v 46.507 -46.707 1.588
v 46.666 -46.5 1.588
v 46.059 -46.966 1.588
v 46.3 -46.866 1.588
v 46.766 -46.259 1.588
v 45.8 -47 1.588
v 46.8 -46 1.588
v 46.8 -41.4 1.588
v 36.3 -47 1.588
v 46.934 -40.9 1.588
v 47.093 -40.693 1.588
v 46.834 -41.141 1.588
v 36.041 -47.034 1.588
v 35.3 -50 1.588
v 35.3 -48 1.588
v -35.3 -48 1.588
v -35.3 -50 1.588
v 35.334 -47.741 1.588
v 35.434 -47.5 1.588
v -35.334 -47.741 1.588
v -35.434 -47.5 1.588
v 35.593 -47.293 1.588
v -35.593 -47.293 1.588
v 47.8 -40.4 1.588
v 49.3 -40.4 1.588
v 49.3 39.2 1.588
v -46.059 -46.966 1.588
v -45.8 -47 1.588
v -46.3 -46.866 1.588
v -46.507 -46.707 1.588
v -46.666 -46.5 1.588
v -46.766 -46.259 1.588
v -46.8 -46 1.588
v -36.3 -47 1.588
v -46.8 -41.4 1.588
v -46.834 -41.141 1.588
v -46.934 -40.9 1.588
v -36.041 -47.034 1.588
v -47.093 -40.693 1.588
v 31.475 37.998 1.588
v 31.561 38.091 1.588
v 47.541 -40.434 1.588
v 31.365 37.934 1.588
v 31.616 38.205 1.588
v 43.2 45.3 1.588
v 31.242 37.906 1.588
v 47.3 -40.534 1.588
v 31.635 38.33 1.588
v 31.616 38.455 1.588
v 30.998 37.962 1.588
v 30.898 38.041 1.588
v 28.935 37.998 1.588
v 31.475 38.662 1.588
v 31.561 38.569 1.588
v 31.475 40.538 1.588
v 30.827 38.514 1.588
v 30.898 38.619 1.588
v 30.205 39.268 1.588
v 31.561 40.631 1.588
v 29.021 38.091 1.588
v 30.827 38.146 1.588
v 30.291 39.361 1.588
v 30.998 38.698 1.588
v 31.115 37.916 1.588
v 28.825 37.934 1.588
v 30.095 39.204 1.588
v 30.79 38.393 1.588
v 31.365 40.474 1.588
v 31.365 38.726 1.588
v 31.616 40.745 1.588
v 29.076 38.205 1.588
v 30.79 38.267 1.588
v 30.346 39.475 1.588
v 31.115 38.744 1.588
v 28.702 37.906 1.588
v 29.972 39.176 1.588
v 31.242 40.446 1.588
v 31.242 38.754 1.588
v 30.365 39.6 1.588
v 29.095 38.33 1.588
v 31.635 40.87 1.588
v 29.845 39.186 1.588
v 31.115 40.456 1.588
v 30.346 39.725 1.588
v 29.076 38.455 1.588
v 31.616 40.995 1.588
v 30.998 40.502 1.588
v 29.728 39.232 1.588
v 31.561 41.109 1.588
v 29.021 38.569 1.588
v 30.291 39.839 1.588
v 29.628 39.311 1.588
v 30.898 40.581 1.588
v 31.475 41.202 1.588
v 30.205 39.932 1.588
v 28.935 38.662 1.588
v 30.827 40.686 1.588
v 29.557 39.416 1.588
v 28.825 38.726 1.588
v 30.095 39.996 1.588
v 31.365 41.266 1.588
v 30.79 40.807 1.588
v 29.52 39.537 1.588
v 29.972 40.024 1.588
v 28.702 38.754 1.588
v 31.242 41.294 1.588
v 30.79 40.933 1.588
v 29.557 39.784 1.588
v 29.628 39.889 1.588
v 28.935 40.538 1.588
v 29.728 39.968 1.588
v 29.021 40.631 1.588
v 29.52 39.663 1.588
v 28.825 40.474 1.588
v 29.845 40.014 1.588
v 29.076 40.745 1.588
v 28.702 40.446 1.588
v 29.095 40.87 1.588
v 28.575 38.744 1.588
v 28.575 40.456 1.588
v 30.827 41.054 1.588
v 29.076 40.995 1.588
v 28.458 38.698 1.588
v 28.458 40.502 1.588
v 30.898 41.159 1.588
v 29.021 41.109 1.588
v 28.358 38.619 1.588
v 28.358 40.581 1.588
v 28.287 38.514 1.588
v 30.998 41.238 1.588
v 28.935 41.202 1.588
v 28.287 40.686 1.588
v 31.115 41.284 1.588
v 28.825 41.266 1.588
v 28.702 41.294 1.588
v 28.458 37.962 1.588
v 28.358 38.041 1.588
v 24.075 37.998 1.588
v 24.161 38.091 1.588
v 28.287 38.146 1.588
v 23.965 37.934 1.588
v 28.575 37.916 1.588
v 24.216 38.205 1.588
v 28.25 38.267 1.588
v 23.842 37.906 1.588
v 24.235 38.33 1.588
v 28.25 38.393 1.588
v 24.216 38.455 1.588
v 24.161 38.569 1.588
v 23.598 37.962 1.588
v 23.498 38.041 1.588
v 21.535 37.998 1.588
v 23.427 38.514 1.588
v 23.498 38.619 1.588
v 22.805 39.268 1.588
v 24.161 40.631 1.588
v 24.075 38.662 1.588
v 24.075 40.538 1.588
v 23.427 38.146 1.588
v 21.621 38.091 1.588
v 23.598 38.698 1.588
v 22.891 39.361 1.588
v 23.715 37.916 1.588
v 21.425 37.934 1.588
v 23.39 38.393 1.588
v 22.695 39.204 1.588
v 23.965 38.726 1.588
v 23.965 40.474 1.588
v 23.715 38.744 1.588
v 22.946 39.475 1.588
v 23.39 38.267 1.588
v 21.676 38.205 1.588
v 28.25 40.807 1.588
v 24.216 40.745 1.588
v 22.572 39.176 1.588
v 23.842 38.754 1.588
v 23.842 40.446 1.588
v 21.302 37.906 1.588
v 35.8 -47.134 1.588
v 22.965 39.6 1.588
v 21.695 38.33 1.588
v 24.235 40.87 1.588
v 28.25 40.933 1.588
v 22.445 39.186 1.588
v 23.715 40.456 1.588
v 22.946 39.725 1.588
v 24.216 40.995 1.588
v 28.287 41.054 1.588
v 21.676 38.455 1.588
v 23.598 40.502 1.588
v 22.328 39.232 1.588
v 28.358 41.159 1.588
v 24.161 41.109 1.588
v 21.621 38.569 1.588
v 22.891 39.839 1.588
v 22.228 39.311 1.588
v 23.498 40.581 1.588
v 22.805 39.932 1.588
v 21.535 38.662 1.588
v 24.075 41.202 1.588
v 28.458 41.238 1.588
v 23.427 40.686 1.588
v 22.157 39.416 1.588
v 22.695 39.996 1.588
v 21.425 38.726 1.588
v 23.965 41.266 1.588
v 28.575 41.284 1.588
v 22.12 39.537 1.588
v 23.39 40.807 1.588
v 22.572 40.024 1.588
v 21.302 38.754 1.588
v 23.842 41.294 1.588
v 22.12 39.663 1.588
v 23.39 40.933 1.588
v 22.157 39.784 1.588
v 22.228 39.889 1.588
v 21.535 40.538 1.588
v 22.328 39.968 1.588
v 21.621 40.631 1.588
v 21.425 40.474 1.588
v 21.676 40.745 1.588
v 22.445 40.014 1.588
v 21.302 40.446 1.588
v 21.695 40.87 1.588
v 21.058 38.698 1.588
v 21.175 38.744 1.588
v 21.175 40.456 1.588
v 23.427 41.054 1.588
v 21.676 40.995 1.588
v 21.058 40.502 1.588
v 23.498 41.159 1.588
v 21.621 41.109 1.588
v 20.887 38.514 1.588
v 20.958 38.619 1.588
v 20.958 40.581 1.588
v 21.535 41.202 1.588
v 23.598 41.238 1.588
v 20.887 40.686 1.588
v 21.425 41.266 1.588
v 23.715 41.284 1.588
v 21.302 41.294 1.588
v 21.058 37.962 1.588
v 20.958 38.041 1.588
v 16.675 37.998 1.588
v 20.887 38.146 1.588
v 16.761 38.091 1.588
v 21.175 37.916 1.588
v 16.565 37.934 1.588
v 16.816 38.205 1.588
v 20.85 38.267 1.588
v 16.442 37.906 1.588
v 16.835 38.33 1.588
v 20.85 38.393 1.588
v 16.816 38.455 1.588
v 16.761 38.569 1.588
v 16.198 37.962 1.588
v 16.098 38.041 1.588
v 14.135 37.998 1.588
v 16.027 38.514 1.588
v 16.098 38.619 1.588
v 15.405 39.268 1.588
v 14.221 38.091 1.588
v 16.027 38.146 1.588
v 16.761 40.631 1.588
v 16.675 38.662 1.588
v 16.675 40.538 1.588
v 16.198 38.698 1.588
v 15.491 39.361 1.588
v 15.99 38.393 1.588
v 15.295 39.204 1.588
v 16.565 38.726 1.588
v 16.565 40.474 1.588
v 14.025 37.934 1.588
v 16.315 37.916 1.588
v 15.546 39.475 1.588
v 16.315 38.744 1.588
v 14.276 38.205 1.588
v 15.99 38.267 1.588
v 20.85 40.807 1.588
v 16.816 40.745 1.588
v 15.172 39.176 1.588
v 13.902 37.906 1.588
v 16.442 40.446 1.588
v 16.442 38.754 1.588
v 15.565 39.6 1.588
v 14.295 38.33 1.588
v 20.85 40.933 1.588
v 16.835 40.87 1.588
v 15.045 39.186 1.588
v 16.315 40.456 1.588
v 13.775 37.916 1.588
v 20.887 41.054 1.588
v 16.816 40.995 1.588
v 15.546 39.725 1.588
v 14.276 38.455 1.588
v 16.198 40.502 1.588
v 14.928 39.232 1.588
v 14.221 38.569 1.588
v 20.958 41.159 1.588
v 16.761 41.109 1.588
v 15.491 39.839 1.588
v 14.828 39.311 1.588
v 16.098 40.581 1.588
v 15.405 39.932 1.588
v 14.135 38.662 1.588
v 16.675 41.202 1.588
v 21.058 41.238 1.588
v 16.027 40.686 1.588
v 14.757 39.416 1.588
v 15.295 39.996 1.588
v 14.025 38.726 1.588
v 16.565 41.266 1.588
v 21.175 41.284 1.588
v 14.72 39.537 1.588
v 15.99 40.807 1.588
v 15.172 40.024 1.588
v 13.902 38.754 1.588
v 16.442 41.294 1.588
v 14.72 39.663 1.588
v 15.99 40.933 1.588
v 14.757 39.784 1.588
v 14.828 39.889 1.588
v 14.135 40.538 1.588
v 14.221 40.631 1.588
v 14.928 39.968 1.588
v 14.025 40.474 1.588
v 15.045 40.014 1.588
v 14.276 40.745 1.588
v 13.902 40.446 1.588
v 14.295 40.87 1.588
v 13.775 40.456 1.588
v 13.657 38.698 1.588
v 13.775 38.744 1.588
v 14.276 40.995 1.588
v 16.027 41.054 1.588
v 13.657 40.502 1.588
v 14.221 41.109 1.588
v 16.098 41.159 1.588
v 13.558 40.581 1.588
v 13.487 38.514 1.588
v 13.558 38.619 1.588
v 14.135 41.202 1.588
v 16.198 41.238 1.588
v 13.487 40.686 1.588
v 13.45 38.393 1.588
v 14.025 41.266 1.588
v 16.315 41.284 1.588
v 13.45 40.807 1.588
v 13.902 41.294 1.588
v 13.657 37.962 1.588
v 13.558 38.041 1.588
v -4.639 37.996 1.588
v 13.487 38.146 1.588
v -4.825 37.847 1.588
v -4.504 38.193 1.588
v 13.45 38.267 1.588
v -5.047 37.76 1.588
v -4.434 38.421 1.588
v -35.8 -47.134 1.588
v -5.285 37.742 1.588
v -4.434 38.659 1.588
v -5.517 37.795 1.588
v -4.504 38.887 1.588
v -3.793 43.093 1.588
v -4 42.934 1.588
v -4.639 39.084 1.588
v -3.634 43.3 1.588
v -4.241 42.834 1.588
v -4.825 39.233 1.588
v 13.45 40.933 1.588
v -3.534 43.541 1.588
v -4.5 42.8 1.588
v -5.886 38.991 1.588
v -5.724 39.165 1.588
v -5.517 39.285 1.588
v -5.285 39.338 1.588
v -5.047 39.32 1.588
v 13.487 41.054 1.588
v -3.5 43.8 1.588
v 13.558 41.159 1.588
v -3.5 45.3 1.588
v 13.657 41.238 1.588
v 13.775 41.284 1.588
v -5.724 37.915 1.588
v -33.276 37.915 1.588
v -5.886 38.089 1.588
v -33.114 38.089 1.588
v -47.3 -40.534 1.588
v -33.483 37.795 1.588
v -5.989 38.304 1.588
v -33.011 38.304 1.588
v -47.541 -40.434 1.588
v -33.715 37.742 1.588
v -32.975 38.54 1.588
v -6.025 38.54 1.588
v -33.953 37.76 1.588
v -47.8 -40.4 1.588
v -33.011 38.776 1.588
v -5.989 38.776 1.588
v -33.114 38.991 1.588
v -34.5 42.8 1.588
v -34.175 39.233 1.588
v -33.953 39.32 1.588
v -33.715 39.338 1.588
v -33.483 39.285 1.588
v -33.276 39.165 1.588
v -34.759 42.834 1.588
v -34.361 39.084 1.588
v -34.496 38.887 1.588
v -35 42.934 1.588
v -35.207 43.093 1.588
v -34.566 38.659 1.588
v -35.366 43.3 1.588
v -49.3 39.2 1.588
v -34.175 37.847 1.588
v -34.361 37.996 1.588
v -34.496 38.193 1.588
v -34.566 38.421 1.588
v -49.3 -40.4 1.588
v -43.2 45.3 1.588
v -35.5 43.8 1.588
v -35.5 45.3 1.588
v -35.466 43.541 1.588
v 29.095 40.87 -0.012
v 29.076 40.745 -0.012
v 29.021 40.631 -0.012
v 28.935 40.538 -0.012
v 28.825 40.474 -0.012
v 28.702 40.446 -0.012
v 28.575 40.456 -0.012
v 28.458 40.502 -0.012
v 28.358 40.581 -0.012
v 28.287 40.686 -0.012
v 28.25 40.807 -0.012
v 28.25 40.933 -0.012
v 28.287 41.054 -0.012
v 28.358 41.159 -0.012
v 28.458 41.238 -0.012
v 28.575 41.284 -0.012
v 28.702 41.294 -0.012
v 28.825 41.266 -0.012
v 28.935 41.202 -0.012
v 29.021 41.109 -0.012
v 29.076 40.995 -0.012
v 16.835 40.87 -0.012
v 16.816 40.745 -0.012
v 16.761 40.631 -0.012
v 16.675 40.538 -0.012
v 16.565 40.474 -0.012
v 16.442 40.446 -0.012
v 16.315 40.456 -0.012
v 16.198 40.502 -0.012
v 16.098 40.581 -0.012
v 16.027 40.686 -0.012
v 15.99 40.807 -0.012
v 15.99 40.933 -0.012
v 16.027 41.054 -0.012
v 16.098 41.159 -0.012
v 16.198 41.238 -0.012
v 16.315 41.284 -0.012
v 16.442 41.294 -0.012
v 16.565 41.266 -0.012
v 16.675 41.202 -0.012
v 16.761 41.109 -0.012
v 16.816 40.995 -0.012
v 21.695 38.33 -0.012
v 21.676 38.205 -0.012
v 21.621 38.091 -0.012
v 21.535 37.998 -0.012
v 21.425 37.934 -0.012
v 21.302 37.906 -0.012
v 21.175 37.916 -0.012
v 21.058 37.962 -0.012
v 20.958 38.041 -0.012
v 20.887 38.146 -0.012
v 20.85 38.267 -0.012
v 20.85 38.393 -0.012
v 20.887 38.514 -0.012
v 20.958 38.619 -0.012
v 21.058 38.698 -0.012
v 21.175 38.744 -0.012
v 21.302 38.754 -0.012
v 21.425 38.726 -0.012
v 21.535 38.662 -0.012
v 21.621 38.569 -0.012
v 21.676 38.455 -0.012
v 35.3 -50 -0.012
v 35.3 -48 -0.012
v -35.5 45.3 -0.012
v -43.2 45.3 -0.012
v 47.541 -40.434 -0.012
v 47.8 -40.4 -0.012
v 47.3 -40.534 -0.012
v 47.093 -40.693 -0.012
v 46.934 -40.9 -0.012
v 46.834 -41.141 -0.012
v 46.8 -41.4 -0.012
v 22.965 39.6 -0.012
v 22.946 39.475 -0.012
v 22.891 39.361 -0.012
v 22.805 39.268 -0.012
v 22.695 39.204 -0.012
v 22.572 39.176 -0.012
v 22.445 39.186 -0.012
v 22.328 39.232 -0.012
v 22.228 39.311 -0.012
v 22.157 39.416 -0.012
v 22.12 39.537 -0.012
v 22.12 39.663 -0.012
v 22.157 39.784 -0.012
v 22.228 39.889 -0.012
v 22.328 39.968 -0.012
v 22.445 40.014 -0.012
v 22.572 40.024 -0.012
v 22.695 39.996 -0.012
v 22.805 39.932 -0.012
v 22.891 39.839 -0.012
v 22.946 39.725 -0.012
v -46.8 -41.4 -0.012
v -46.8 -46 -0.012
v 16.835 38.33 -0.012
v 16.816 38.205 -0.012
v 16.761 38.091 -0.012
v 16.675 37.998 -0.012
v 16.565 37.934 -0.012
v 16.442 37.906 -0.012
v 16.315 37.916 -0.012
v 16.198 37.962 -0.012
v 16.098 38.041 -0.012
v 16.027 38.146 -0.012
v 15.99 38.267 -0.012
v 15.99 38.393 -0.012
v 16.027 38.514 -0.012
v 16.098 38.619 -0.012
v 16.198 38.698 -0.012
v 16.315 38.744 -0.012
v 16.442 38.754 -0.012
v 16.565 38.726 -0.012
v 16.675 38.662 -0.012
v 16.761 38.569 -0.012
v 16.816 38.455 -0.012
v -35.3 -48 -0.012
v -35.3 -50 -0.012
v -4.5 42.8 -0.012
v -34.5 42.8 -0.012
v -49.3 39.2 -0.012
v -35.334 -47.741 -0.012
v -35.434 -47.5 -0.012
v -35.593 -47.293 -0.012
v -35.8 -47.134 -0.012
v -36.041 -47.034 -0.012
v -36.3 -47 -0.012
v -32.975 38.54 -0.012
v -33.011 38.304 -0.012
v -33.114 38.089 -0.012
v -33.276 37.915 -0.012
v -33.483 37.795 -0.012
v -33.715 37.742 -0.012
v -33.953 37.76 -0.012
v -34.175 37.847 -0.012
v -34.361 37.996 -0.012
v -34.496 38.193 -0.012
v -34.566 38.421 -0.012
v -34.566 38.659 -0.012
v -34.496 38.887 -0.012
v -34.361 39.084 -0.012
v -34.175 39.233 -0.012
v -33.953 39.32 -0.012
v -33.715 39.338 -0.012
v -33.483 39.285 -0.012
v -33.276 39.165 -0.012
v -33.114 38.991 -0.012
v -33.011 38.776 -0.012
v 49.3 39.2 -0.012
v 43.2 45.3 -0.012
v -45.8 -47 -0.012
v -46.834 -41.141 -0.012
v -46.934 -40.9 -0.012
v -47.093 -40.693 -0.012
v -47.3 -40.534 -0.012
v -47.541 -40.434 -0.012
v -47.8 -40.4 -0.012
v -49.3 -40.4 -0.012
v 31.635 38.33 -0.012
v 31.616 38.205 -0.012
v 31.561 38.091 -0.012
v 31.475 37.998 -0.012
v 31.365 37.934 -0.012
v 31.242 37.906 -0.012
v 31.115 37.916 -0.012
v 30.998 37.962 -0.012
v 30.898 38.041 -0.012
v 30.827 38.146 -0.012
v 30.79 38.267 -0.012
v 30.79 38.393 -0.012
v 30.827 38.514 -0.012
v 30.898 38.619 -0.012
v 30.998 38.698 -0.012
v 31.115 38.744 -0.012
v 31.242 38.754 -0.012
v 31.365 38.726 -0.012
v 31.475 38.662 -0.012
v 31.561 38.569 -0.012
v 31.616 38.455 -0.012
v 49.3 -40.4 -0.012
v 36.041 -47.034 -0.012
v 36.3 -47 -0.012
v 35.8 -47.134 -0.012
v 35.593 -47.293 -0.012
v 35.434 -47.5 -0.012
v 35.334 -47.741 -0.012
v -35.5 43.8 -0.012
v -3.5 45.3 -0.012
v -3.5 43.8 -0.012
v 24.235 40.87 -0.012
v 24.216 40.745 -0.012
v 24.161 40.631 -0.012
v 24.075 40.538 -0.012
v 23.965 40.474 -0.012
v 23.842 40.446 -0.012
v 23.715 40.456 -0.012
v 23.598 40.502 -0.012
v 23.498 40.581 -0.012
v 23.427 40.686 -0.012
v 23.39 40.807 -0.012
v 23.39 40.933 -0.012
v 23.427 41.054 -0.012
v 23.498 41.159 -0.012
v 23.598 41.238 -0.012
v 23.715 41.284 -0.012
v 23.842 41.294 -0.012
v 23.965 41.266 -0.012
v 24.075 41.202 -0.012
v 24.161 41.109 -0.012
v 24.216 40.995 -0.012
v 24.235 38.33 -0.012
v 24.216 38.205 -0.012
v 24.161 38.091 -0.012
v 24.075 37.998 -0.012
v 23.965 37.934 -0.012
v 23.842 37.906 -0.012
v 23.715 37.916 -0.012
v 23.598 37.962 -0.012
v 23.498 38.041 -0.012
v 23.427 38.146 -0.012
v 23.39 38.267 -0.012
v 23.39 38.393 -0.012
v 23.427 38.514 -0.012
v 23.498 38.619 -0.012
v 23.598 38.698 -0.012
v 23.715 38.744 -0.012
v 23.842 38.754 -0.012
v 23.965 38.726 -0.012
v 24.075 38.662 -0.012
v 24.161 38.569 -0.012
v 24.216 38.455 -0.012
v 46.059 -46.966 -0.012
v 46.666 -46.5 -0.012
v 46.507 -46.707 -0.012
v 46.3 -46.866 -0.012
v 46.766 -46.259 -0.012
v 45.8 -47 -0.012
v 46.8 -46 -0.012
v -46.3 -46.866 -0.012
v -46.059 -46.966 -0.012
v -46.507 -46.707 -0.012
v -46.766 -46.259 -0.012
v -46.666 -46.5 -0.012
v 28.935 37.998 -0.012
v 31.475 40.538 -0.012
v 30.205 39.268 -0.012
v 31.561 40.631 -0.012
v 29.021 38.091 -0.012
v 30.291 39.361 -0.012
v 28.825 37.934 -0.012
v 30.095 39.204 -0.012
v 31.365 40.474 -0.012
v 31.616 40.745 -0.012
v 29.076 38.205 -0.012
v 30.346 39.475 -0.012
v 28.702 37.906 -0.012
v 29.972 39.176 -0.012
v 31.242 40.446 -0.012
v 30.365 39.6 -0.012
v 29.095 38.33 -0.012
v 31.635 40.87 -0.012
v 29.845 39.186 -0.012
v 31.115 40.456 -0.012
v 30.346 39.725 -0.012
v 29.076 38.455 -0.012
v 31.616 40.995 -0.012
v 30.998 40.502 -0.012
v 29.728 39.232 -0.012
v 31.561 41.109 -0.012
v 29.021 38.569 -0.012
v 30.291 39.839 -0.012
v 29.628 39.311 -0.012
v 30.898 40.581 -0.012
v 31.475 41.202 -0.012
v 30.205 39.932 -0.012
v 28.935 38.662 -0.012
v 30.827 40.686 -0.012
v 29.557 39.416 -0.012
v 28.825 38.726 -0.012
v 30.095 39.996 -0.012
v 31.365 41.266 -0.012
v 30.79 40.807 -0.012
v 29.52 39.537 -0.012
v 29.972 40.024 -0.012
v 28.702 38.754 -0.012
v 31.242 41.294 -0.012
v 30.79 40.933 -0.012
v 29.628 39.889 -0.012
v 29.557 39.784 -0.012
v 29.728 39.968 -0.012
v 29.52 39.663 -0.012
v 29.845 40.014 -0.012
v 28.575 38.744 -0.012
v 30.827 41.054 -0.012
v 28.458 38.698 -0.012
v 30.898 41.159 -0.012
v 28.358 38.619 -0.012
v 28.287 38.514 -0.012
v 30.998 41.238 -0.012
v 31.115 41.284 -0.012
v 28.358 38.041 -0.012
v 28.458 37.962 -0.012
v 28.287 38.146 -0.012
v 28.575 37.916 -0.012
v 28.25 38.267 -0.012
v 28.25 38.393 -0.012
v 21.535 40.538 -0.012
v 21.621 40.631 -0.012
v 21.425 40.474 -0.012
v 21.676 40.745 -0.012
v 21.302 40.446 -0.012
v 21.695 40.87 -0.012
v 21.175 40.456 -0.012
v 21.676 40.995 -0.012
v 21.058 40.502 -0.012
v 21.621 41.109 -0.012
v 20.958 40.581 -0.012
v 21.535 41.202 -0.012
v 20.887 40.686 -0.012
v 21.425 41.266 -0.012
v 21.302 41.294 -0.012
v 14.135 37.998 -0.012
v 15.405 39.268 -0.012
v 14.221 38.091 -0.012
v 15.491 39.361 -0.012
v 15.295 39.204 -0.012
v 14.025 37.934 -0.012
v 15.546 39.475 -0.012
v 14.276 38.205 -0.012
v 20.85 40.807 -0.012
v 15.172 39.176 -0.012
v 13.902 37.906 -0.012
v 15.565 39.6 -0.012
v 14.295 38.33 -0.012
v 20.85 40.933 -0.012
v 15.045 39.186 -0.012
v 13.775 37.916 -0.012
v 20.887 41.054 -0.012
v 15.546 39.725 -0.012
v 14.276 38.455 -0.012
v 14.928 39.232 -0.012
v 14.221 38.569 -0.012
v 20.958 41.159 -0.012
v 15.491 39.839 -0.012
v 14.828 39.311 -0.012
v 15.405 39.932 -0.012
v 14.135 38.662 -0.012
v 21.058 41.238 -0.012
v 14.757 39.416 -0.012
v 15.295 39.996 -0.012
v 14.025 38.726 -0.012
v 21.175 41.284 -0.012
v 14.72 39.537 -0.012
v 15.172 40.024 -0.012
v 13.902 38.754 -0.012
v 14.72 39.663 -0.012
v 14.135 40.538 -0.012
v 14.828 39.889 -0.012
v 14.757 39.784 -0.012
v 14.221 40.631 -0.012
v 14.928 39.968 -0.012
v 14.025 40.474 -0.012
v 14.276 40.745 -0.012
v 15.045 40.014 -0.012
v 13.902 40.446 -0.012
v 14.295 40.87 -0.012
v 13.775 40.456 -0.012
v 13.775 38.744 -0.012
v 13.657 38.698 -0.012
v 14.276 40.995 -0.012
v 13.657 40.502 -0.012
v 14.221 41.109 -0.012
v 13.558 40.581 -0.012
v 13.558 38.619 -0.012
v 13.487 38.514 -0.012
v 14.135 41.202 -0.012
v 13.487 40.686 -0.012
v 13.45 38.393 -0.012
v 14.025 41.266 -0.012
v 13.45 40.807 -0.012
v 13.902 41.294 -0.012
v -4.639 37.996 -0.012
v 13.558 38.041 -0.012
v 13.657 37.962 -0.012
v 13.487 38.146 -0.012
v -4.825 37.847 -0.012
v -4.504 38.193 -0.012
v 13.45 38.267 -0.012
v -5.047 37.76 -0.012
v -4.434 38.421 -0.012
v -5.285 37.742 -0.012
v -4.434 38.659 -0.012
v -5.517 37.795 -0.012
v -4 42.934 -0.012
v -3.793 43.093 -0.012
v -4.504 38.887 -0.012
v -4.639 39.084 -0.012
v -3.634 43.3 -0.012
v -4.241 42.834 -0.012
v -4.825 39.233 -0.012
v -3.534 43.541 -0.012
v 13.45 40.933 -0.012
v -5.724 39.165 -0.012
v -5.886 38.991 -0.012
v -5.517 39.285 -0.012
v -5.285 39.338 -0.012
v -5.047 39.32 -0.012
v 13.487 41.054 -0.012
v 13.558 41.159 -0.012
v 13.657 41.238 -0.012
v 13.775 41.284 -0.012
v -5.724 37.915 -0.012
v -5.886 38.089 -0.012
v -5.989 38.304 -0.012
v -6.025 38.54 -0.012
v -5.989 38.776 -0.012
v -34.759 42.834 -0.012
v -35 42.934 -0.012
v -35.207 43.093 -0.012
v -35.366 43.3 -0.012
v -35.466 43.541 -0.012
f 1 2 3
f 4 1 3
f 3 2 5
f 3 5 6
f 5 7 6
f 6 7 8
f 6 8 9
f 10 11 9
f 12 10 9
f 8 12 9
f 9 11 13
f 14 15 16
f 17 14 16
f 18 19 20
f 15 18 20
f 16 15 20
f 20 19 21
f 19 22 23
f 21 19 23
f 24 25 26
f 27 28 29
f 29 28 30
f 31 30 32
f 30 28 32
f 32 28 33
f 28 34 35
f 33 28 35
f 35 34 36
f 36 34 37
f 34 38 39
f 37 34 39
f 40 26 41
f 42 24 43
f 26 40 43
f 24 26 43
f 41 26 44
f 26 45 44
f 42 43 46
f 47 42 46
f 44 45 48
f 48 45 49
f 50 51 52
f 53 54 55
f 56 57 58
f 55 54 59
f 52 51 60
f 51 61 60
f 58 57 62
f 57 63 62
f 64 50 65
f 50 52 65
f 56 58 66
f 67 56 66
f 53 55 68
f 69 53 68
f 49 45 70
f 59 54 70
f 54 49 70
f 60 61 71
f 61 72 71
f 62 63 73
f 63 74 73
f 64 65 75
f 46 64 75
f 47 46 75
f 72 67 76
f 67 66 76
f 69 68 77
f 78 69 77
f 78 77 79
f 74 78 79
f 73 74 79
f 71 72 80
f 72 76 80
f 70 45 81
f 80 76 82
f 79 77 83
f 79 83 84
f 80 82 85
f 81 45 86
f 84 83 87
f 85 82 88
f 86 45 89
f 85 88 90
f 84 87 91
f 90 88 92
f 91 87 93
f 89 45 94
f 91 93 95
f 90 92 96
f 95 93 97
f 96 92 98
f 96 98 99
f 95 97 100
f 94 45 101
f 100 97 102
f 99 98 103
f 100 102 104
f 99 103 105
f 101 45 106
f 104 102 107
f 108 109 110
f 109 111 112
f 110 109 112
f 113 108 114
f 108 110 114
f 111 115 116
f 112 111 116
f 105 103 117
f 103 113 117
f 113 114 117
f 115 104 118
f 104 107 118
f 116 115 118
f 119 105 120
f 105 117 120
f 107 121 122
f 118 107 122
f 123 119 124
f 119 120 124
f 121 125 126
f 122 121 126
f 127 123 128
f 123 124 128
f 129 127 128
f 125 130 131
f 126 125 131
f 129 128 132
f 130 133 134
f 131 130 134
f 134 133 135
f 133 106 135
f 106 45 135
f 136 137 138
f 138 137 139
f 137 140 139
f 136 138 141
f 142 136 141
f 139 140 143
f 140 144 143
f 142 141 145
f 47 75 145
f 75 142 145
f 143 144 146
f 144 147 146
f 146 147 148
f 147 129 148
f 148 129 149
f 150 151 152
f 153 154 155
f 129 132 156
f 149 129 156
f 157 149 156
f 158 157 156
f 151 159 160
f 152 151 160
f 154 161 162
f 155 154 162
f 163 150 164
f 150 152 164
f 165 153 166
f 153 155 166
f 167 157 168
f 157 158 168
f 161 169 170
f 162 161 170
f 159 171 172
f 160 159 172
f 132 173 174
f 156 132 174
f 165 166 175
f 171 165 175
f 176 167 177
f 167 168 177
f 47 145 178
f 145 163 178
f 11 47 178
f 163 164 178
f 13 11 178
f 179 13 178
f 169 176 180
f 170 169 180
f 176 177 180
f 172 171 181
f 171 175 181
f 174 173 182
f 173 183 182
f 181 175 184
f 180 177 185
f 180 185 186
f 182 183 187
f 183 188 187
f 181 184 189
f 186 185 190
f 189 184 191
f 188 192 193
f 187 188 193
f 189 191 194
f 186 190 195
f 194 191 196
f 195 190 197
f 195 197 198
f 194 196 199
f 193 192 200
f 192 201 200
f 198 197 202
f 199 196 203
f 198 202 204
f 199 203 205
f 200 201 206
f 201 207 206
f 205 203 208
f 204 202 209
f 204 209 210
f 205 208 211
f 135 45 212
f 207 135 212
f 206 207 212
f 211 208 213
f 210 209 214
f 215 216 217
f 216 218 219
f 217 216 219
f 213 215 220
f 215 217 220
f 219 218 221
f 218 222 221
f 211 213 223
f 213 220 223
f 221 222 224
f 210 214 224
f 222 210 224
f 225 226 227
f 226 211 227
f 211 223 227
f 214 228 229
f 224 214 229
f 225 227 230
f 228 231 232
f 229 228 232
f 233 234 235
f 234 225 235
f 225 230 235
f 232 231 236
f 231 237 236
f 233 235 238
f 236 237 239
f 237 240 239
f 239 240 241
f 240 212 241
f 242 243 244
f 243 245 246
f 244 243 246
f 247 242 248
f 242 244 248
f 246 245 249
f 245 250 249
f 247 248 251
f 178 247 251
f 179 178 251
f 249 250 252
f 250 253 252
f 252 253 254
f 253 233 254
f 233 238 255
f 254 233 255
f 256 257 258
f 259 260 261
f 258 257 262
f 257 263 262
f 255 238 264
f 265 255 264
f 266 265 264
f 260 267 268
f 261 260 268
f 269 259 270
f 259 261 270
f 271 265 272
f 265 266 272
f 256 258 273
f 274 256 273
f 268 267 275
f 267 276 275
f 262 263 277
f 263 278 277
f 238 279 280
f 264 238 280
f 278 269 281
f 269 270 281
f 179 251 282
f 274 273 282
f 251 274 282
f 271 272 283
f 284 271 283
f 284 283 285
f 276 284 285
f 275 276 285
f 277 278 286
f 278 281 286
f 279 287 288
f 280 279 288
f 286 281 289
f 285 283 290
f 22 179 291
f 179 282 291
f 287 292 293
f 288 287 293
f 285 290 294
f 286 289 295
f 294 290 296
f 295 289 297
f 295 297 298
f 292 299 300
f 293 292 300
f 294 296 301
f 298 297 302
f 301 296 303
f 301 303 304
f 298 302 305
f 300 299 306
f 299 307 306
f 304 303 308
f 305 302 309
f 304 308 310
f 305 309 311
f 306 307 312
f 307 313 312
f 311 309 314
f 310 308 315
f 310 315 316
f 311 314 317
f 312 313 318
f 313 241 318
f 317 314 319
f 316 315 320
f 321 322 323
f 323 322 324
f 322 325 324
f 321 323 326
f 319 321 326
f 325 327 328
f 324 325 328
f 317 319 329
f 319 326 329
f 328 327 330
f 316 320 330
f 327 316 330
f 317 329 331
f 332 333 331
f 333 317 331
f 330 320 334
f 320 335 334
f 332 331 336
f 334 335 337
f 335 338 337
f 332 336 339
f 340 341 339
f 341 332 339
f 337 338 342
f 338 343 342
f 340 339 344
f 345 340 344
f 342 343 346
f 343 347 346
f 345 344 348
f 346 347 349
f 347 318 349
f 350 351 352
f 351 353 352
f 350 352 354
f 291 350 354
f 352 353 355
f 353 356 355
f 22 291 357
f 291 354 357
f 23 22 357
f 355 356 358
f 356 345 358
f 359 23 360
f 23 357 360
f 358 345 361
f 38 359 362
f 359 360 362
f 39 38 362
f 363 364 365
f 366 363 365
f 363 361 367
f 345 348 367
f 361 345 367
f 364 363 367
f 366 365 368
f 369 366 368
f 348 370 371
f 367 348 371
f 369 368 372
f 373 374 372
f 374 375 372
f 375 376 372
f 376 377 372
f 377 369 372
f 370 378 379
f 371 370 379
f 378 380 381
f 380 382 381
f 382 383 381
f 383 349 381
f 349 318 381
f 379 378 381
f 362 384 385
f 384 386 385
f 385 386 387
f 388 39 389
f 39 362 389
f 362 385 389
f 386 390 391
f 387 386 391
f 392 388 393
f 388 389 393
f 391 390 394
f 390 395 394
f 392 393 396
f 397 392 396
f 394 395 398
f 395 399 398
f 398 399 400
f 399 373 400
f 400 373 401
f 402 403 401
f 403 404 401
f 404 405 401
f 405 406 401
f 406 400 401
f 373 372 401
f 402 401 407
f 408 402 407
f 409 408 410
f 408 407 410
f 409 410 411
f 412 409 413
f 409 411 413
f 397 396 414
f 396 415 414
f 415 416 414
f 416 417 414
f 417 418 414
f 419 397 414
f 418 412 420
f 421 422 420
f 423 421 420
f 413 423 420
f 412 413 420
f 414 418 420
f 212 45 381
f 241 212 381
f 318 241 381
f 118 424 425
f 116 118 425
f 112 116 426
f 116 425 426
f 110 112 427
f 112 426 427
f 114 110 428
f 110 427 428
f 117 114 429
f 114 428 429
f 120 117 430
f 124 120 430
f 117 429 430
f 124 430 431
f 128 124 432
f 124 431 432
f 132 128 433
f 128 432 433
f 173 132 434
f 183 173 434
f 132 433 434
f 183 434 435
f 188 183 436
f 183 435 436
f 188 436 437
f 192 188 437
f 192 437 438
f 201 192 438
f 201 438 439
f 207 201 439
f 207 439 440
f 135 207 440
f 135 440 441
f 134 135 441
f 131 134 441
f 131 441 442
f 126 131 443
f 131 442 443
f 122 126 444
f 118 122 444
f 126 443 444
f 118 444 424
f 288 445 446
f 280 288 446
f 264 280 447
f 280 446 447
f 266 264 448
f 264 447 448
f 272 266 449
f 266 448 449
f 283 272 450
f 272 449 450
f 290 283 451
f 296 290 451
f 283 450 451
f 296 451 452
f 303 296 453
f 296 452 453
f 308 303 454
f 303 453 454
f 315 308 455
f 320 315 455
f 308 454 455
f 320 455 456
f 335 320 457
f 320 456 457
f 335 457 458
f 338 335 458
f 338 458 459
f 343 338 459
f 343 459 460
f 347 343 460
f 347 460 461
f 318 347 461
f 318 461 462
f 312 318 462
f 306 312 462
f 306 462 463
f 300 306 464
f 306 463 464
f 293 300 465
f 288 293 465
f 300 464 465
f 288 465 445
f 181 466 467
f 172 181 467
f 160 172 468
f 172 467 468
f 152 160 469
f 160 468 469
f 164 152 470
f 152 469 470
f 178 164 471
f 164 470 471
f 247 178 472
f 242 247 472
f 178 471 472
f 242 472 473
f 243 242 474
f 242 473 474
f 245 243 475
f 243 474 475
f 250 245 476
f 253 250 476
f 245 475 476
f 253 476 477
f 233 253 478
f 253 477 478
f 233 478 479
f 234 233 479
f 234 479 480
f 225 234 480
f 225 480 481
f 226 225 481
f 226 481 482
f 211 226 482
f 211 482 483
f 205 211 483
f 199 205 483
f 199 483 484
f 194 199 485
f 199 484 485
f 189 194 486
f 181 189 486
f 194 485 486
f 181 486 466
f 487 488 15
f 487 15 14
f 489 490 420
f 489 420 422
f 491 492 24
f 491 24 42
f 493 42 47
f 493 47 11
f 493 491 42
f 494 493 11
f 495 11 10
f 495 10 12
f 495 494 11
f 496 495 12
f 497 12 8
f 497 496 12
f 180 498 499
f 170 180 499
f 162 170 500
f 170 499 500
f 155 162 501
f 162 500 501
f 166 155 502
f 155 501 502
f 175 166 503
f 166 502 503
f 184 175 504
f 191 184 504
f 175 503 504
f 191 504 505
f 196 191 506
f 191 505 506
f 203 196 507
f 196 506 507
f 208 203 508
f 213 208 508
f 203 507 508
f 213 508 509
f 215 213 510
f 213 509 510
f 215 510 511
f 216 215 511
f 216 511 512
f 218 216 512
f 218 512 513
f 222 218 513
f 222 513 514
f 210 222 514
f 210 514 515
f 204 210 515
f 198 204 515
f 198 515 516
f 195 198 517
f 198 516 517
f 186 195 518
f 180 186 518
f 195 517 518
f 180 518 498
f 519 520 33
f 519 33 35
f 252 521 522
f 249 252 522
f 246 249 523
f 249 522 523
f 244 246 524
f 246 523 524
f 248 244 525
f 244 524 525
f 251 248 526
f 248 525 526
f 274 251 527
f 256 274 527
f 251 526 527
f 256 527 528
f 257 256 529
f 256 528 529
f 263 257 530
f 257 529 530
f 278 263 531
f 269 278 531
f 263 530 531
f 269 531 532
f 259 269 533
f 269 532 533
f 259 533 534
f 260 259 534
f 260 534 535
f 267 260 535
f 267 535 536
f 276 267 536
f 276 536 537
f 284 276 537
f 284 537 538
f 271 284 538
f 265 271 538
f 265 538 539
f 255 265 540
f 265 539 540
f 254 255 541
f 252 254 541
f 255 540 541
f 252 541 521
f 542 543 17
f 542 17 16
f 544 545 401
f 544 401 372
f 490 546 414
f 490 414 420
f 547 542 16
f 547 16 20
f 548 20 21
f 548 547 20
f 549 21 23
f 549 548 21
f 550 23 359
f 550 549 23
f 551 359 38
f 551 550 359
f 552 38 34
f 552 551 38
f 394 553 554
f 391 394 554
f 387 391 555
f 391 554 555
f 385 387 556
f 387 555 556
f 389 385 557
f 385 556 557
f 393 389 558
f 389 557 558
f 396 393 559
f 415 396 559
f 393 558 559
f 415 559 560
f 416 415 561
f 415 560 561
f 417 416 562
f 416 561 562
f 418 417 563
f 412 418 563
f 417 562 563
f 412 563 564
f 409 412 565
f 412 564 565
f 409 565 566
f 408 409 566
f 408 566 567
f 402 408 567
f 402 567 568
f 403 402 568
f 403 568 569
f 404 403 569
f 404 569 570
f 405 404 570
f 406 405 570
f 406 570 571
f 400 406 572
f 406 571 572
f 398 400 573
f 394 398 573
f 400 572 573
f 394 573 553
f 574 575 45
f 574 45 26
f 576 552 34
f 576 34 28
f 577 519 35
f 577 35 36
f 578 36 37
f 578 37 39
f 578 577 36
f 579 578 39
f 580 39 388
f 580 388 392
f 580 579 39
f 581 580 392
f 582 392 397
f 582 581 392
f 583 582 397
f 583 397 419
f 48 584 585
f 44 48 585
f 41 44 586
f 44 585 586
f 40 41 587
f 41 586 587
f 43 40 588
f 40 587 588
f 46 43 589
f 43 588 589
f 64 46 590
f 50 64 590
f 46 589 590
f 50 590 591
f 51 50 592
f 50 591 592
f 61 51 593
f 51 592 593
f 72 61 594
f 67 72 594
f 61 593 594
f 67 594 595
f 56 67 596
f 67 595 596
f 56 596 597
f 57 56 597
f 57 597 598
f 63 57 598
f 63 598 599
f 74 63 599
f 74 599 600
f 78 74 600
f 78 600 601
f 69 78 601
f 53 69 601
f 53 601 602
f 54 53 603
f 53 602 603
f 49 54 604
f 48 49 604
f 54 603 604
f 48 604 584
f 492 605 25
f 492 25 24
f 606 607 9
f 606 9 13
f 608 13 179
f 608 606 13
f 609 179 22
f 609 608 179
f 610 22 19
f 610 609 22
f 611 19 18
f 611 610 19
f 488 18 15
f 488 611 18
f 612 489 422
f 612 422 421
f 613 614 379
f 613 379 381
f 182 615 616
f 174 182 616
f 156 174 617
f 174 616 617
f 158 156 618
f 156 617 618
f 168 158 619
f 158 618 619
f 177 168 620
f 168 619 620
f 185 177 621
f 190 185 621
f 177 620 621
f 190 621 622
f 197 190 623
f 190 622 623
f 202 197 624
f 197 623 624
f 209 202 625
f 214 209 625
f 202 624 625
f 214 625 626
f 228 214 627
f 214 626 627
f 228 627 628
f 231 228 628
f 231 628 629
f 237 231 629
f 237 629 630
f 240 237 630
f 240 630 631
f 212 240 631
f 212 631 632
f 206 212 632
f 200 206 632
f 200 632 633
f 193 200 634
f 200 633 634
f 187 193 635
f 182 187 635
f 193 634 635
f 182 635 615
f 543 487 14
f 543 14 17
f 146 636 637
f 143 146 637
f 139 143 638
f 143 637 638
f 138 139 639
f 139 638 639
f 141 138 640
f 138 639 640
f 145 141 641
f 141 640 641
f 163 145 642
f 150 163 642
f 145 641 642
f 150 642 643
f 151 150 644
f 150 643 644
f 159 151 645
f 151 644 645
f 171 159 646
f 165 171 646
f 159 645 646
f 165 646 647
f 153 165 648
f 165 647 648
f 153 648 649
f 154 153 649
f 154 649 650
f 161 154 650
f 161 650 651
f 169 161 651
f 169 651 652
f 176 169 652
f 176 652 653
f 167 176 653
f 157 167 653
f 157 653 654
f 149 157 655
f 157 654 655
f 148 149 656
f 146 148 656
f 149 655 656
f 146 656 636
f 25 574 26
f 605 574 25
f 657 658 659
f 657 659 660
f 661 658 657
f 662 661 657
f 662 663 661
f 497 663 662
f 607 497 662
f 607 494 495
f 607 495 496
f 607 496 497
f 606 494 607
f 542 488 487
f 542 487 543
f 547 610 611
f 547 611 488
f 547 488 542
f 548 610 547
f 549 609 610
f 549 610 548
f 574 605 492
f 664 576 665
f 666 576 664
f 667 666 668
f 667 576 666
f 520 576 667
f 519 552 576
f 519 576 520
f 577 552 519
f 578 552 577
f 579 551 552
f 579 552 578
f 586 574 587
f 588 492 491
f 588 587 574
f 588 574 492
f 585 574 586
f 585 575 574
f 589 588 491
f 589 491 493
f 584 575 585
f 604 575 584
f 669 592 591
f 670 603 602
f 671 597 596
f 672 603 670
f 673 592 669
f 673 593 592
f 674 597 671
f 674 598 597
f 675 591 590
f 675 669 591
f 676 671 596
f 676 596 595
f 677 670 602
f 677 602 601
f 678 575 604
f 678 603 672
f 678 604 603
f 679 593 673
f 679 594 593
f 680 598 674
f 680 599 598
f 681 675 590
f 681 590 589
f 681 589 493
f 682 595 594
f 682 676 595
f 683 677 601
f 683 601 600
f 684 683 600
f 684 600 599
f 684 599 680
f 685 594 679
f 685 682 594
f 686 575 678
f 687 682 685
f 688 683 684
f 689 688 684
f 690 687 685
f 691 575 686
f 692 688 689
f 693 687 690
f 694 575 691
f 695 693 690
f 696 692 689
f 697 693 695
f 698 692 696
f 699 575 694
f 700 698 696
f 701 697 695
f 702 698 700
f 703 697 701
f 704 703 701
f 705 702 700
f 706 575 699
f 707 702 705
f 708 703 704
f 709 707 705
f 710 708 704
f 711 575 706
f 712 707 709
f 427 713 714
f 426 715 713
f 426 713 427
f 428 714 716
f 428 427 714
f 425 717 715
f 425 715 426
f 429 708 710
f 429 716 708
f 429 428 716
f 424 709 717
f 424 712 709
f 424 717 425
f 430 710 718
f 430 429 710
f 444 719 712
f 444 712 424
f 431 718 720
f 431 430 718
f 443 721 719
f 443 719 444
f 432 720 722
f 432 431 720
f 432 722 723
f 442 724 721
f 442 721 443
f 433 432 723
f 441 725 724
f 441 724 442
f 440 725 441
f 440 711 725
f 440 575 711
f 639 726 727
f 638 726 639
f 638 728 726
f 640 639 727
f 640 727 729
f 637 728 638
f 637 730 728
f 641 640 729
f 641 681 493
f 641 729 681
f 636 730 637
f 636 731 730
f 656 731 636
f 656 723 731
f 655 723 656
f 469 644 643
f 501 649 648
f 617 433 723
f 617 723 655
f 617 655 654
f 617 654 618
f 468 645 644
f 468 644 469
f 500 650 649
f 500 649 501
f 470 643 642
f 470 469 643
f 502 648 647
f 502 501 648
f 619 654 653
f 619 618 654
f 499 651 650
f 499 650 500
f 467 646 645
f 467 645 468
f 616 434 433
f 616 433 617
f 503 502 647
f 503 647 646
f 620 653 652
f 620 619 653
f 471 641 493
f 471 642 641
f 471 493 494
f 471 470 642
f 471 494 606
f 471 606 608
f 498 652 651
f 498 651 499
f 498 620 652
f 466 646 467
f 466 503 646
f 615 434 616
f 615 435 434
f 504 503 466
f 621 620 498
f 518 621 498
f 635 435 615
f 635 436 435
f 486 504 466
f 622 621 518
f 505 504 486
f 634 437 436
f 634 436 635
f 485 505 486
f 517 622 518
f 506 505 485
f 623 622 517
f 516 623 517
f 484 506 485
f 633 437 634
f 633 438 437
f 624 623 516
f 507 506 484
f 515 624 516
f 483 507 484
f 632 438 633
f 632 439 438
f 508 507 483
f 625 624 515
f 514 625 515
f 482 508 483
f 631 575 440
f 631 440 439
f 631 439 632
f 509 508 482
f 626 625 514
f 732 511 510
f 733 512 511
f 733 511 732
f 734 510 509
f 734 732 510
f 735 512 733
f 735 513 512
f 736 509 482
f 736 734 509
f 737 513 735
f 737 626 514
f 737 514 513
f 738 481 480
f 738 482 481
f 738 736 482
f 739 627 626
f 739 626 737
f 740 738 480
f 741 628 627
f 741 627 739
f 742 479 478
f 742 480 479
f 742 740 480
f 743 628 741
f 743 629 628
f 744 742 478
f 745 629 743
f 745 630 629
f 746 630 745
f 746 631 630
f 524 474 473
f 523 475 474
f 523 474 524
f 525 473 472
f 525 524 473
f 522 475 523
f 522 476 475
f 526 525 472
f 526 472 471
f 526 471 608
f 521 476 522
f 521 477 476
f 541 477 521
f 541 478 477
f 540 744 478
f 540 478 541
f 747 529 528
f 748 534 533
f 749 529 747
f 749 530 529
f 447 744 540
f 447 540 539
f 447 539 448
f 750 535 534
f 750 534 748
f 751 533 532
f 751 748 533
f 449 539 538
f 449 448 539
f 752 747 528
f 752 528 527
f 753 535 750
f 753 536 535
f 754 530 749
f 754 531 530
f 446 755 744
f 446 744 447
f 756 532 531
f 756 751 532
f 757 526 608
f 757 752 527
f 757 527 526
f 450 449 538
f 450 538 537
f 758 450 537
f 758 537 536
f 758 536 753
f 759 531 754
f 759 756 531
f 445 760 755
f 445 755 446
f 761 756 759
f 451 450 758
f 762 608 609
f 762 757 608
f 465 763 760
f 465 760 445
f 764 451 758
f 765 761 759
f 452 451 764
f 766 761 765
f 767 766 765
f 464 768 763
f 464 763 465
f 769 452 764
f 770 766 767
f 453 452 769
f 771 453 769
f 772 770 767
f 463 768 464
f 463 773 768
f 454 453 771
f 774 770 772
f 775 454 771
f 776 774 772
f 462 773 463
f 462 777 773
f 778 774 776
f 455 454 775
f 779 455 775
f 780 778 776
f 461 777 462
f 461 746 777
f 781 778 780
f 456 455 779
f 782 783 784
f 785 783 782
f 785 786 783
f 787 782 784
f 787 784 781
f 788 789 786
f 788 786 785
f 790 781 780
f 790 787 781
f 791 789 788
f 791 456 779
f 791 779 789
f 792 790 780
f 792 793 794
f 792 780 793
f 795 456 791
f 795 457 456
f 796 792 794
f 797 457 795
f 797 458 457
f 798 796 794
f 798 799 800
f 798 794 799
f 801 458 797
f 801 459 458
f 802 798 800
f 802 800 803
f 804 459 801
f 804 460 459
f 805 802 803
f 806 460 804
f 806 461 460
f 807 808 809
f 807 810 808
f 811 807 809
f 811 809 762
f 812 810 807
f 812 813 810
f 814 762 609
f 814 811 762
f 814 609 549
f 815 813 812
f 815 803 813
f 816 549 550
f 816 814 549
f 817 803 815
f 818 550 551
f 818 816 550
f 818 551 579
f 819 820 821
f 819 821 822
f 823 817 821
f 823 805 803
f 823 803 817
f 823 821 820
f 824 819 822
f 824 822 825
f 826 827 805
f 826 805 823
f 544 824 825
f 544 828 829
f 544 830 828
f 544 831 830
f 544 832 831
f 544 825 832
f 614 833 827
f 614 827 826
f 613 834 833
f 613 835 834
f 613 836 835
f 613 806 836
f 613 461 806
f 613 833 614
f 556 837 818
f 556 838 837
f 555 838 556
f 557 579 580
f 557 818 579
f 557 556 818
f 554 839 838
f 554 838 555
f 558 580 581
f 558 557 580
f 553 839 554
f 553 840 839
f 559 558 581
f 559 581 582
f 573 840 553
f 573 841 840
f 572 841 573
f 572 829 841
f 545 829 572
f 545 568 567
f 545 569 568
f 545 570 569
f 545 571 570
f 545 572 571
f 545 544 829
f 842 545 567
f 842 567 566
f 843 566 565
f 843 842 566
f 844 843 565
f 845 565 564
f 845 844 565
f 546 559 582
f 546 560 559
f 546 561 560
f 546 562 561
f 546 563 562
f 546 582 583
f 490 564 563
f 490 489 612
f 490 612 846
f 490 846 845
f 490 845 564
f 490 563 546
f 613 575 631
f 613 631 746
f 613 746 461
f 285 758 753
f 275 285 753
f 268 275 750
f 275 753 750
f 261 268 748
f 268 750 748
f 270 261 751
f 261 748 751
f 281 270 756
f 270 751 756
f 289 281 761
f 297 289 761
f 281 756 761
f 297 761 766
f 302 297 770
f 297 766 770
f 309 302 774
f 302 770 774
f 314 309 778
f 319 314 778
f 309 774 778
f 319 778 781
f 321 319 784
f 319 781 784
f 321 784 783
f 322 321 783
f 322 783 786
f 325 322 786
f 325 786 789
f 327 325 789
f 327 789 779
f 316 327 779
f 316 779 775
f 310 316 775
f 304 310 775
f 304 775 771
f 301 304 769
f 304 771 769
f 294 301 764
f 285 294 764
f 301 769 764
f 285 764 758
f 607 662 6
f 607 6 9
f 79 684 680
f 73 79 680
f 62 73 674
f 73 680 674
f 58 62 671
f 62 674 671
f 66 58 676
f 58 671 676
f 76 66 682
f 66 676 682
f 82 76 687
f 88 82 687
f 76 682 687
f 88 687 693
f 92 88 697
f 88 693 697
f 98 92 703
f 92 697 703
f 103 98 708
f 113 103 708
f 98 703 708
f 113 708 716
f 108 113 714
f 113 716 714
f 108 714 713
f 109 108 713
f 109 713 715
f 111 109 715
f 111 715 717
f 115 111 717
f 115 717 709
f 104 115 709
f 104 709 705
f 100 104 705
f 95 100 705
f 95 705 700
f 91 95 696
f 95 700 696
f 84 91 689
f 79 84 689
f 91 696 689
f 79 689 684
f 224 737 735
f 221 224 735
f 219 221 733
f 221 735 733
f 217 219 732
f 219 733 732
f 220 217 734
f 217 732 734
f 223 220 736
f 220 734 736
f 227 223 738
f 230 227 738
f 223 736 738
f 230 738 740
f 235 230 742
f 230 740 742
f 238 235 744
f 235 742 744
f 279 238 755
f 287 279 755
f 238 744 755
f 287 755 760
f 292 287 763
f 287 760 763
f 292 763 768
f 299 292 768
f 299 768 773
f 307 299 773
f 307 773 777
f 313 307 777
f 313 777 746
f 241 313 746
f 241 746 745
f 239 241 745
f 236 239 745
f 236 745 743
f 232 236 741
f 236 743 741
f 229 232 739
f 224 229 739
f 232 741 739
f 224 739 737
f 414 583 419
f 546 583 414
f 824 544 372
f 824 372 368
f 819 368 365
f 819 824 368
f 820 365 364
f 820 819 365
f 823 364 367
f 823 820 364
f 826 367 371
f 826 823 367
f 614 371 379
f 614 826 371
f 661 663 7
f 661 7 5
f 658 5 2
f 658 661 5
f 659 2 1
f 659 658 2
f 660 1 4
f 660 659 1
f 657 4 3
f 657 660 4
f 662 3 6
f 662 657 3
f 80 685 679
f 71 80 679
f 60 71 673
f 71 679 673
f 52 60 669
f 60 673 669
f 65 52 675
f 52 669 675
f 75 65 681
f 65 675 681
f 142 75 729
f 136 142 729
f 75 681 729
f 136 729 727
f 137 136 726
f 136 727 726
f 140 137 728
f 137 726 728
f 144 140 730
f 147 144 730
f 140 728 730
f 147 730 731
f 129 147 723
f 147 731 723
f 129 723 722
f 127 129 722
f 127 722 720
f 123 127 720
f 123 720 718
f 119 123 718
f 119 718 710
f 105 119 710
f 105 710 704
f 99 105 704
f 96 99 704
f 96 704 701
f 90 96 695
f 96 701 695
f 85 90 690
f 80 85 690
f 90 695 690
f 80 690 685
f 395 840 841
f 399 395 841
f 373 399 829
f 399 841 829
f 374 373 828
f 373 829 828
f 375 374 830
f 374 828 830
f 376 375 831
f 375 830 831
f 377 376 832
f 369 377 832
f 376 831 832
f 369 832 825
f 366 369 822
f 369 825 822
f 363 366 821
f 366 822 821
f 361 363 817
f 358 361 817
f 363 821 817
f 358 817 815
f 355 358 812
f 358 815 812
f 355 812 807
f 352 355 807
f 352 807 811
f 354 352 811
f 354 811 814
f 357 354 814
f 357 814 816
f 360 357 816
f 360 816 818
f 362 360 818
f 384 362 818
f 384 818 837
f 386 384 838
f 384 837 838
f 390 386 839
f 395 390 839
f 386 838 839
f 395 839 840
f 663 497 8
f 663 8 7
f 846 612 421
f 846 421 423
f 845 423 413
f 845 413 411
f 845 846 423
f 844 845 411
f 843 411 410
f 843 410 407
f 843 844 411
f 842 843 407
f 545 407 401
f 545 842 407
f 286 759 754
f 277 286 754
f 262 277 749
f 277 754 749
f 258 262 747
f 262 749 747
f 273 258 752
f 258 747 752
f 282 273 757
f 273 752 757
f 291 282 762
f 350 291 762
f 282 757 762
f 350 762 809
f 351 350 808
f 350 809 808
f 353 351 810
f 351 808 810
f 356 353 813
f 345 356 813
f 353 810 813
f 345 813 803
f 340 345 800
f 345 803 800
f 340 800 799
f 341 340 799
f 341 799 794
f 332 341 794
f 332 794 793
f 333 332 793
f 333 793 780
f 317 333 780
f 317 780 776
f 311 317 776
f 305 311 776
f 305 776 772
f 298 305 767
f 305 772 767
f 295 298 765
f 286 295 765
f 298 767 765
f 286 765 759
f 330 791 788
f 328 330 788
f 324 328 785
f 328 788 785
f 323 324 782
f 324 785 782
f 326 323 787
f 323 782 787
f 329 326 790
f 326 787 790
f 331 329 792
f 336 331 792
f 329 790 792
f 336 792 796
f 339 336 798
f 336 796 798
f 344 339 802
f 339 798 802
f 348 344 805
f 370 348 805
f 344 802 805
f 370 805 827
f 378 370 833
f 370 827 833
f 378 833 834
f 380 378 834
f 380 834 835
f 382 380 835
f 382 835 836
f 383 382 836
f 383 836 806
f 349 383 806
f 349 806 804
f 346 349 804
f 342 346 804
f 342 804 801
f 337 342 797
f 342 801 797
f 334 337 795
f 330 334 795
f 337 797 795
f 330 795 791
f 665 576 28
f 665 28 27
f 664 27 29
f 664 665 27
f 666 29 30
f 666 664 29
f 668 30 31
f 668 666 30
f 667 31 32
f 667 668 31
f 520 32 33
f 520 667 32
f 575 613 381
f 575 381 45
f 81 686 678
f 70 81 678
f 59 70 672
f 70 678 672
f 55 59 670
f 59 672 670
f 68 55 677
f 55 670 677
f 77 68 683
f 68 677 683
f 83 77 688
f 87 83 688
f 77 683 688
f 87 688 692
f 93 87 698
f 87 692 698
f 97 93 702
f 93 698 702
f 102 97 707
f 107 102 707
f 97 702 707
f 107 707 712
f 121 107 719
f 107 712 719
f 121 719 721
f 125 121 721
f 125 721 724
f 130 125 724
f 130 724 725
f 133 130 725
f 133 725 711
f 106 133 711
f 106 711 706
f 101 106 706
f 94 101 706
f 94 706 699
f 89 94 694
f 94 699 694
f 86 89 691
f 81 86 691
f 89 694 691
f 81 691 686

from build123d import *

# Parameters (mm, degrees)
SKETCH1_R           = 0.425
SKETCH1_R_2         = 0.8
BOSS_EXTRUDE1_DEPTH = 1.6


with BuildPart() as part:
    # Sketch1 → Boss-Extrude1 (new body)
    with BuildSketch(Plane(origin=(0, 0, -0.0125), x_dir=(-1, 0, 0), z_dir=(0, 0, -1))):
        with BuildLine():
            Line((35.3, -50), (35.3, -48))
            ThreePointArc((35.3, -48), (35.592893219, -47.292893219), (36.3, -47))
            Line((36.3, -47), (45.8, -47))
            ThreePointArc((45.8, -47), (46.507106781, -46.707106781), (46.8, -46))
            Line((46.8, -46), (46.8, -41.4))
            ThreePointArc((46.8, -41.4), (47.092893219, -40.692893219), (47.8, -40.4))
            Line((47.8, -40.4), (49.3, -40.4))
            Line((49.3, -40.4), (49.3, 39.2))
            Line((49.3, 39.2), (43.2, 45.3))
            Line((43.2, 45.3), (35.500000002, 45.3))
            Line((35.500000002, 45.3), (35.500000002, 43.8))
            ThreePointArc((35.500000002, 43.8), (35.207106783, 43.092893219), (34.500000002, 42.8))
            Line((34.500000002, 42.8), (4.499999998, 42.8))
            ThreePointArc((4.499999998, 42.8), (3.792893217, 43.092893219), (3.499999998, 43.8))
            Line((3.499999998, 43.8), (3.499999998, 45.3))
            Line((3.499999998, 45.3), (-43.2, 45.3))
            Line((-43.2, 45.3), (-49.3, 39.2))
            Line((-49.3, 39.2), (-49.3, -40.4))
            Line((-49.3, -40.4), (-47.8, -40.4))
            ThreePointArc((-47.8, -40.4), (-47.092893219, -40.692893219), (-46.8, -41.4))
            Line((-46.8, -41.4), (-46.8, -46))
            ThreePointArc((-46.8, -46), (-46.507106781, -46.707106781), (-45.8, -47))
            Line((-45.8, -47), (-36.3, -47))
            ThreePointArc((-36.3, -47), (-35.592893219, -47.292893219), (-35.3, -48))
            Line((-35.3, -48), (-35.3, -50))
            Line((-35.3, -50), (35.3, -50))
        make_face()
        with Locations(Location((-21.27, 40.87, 0), (0, 0, 180))):
            Circle(SKETCH1_R, mode=Mode.SUBTRACT)
        with Locations(Location((-23.81, 40.87, 0), (0, 0, 180))):
            Circle(SKETCH1_R, mode=Mode.SUBTRACT)
        with Locations(Location((-22.54, 39.6, 0), (0, 0, 180))):
            Circle(SKETCH1_R, mode=Mode.SUBTRACT)
        with Locations(Location((-13.87, 40.87, 0), (0, 0, 180))):
            Circle(SKETCH1_R, mode=Mode.SUBTRACT)
        with Locations(Location((-23.81, 38.33, 0), (0, 0, 180))):
            Circle(SKETCH1_R, mode=Mode.SUBTRACT)
        with Locations(Location((-16.41, 40.87, 0), (0, 0, 180))):
            Circle(SKETCH1_R, mode=Mode.SUBTRACT)
        with Locations(Location((-15.14, 39.6, 0), (0, 0, 180))):
            Circle(SKETCH1_R, mode=Mode.SUBTRACT)
        with Locations(Location((-21.27, 38.33, 0), (0, 0, 180))):
            Circle(SKETCH1_R, mode=Mode.SUBTRACT)
        with Locations(Location((-28.67, 40.87, 0), (0, 0, 180))):
            Circle(SKETCH1_R, mode=Mode.SUBTRACT)
        with Locations(Location((-31.21, 40.87, 0), (0, 0, 180))):
            Circle(SKETCH1_R, mode=Mode.SUBTRACT)
        with Locations(Location((-16.41, 38.33, 0), (0, 0, 180))):
            Circle(SKETCH1_R, mode=Mode.SUBTRACT)
        with Locations(Location((-29.94, 39.6, 0), (0, 0, 180))):
            Circle(SKETCH1_R, mode=Mode.SUBTRACT)
        with Locations(Location((-31.21, 38.33, 0), (0, 0, 180))):
            Circle(SKETCH1_R, mode=Mode.SUBTRACT)
        with Locations(Location((-28.67, 38.33, 0), (0, 0, 180))):
            Circle(SKETCH1_R, mode=Mode.SUBTRACT)
        with Locations(Location((33.775, 38.54, 0), (0, 0, 180))):
            Circle(SKETCH1_R_2, mode=Mode.SUBTRACT)
        with Locations((5.225, 38.54)):
            Circle(SKETCH1_R_2, mode=Mode.SUBTRACT)
        with Locations(Location((-13.87, 38.33, 0), (0, 0, 180))):
            Circle(SKETCH1_R, mode=Mode.SUBTRACT)
    extrude(amount=-BOSS_EXTRUDE1_DEPTH)


solid = part.part
